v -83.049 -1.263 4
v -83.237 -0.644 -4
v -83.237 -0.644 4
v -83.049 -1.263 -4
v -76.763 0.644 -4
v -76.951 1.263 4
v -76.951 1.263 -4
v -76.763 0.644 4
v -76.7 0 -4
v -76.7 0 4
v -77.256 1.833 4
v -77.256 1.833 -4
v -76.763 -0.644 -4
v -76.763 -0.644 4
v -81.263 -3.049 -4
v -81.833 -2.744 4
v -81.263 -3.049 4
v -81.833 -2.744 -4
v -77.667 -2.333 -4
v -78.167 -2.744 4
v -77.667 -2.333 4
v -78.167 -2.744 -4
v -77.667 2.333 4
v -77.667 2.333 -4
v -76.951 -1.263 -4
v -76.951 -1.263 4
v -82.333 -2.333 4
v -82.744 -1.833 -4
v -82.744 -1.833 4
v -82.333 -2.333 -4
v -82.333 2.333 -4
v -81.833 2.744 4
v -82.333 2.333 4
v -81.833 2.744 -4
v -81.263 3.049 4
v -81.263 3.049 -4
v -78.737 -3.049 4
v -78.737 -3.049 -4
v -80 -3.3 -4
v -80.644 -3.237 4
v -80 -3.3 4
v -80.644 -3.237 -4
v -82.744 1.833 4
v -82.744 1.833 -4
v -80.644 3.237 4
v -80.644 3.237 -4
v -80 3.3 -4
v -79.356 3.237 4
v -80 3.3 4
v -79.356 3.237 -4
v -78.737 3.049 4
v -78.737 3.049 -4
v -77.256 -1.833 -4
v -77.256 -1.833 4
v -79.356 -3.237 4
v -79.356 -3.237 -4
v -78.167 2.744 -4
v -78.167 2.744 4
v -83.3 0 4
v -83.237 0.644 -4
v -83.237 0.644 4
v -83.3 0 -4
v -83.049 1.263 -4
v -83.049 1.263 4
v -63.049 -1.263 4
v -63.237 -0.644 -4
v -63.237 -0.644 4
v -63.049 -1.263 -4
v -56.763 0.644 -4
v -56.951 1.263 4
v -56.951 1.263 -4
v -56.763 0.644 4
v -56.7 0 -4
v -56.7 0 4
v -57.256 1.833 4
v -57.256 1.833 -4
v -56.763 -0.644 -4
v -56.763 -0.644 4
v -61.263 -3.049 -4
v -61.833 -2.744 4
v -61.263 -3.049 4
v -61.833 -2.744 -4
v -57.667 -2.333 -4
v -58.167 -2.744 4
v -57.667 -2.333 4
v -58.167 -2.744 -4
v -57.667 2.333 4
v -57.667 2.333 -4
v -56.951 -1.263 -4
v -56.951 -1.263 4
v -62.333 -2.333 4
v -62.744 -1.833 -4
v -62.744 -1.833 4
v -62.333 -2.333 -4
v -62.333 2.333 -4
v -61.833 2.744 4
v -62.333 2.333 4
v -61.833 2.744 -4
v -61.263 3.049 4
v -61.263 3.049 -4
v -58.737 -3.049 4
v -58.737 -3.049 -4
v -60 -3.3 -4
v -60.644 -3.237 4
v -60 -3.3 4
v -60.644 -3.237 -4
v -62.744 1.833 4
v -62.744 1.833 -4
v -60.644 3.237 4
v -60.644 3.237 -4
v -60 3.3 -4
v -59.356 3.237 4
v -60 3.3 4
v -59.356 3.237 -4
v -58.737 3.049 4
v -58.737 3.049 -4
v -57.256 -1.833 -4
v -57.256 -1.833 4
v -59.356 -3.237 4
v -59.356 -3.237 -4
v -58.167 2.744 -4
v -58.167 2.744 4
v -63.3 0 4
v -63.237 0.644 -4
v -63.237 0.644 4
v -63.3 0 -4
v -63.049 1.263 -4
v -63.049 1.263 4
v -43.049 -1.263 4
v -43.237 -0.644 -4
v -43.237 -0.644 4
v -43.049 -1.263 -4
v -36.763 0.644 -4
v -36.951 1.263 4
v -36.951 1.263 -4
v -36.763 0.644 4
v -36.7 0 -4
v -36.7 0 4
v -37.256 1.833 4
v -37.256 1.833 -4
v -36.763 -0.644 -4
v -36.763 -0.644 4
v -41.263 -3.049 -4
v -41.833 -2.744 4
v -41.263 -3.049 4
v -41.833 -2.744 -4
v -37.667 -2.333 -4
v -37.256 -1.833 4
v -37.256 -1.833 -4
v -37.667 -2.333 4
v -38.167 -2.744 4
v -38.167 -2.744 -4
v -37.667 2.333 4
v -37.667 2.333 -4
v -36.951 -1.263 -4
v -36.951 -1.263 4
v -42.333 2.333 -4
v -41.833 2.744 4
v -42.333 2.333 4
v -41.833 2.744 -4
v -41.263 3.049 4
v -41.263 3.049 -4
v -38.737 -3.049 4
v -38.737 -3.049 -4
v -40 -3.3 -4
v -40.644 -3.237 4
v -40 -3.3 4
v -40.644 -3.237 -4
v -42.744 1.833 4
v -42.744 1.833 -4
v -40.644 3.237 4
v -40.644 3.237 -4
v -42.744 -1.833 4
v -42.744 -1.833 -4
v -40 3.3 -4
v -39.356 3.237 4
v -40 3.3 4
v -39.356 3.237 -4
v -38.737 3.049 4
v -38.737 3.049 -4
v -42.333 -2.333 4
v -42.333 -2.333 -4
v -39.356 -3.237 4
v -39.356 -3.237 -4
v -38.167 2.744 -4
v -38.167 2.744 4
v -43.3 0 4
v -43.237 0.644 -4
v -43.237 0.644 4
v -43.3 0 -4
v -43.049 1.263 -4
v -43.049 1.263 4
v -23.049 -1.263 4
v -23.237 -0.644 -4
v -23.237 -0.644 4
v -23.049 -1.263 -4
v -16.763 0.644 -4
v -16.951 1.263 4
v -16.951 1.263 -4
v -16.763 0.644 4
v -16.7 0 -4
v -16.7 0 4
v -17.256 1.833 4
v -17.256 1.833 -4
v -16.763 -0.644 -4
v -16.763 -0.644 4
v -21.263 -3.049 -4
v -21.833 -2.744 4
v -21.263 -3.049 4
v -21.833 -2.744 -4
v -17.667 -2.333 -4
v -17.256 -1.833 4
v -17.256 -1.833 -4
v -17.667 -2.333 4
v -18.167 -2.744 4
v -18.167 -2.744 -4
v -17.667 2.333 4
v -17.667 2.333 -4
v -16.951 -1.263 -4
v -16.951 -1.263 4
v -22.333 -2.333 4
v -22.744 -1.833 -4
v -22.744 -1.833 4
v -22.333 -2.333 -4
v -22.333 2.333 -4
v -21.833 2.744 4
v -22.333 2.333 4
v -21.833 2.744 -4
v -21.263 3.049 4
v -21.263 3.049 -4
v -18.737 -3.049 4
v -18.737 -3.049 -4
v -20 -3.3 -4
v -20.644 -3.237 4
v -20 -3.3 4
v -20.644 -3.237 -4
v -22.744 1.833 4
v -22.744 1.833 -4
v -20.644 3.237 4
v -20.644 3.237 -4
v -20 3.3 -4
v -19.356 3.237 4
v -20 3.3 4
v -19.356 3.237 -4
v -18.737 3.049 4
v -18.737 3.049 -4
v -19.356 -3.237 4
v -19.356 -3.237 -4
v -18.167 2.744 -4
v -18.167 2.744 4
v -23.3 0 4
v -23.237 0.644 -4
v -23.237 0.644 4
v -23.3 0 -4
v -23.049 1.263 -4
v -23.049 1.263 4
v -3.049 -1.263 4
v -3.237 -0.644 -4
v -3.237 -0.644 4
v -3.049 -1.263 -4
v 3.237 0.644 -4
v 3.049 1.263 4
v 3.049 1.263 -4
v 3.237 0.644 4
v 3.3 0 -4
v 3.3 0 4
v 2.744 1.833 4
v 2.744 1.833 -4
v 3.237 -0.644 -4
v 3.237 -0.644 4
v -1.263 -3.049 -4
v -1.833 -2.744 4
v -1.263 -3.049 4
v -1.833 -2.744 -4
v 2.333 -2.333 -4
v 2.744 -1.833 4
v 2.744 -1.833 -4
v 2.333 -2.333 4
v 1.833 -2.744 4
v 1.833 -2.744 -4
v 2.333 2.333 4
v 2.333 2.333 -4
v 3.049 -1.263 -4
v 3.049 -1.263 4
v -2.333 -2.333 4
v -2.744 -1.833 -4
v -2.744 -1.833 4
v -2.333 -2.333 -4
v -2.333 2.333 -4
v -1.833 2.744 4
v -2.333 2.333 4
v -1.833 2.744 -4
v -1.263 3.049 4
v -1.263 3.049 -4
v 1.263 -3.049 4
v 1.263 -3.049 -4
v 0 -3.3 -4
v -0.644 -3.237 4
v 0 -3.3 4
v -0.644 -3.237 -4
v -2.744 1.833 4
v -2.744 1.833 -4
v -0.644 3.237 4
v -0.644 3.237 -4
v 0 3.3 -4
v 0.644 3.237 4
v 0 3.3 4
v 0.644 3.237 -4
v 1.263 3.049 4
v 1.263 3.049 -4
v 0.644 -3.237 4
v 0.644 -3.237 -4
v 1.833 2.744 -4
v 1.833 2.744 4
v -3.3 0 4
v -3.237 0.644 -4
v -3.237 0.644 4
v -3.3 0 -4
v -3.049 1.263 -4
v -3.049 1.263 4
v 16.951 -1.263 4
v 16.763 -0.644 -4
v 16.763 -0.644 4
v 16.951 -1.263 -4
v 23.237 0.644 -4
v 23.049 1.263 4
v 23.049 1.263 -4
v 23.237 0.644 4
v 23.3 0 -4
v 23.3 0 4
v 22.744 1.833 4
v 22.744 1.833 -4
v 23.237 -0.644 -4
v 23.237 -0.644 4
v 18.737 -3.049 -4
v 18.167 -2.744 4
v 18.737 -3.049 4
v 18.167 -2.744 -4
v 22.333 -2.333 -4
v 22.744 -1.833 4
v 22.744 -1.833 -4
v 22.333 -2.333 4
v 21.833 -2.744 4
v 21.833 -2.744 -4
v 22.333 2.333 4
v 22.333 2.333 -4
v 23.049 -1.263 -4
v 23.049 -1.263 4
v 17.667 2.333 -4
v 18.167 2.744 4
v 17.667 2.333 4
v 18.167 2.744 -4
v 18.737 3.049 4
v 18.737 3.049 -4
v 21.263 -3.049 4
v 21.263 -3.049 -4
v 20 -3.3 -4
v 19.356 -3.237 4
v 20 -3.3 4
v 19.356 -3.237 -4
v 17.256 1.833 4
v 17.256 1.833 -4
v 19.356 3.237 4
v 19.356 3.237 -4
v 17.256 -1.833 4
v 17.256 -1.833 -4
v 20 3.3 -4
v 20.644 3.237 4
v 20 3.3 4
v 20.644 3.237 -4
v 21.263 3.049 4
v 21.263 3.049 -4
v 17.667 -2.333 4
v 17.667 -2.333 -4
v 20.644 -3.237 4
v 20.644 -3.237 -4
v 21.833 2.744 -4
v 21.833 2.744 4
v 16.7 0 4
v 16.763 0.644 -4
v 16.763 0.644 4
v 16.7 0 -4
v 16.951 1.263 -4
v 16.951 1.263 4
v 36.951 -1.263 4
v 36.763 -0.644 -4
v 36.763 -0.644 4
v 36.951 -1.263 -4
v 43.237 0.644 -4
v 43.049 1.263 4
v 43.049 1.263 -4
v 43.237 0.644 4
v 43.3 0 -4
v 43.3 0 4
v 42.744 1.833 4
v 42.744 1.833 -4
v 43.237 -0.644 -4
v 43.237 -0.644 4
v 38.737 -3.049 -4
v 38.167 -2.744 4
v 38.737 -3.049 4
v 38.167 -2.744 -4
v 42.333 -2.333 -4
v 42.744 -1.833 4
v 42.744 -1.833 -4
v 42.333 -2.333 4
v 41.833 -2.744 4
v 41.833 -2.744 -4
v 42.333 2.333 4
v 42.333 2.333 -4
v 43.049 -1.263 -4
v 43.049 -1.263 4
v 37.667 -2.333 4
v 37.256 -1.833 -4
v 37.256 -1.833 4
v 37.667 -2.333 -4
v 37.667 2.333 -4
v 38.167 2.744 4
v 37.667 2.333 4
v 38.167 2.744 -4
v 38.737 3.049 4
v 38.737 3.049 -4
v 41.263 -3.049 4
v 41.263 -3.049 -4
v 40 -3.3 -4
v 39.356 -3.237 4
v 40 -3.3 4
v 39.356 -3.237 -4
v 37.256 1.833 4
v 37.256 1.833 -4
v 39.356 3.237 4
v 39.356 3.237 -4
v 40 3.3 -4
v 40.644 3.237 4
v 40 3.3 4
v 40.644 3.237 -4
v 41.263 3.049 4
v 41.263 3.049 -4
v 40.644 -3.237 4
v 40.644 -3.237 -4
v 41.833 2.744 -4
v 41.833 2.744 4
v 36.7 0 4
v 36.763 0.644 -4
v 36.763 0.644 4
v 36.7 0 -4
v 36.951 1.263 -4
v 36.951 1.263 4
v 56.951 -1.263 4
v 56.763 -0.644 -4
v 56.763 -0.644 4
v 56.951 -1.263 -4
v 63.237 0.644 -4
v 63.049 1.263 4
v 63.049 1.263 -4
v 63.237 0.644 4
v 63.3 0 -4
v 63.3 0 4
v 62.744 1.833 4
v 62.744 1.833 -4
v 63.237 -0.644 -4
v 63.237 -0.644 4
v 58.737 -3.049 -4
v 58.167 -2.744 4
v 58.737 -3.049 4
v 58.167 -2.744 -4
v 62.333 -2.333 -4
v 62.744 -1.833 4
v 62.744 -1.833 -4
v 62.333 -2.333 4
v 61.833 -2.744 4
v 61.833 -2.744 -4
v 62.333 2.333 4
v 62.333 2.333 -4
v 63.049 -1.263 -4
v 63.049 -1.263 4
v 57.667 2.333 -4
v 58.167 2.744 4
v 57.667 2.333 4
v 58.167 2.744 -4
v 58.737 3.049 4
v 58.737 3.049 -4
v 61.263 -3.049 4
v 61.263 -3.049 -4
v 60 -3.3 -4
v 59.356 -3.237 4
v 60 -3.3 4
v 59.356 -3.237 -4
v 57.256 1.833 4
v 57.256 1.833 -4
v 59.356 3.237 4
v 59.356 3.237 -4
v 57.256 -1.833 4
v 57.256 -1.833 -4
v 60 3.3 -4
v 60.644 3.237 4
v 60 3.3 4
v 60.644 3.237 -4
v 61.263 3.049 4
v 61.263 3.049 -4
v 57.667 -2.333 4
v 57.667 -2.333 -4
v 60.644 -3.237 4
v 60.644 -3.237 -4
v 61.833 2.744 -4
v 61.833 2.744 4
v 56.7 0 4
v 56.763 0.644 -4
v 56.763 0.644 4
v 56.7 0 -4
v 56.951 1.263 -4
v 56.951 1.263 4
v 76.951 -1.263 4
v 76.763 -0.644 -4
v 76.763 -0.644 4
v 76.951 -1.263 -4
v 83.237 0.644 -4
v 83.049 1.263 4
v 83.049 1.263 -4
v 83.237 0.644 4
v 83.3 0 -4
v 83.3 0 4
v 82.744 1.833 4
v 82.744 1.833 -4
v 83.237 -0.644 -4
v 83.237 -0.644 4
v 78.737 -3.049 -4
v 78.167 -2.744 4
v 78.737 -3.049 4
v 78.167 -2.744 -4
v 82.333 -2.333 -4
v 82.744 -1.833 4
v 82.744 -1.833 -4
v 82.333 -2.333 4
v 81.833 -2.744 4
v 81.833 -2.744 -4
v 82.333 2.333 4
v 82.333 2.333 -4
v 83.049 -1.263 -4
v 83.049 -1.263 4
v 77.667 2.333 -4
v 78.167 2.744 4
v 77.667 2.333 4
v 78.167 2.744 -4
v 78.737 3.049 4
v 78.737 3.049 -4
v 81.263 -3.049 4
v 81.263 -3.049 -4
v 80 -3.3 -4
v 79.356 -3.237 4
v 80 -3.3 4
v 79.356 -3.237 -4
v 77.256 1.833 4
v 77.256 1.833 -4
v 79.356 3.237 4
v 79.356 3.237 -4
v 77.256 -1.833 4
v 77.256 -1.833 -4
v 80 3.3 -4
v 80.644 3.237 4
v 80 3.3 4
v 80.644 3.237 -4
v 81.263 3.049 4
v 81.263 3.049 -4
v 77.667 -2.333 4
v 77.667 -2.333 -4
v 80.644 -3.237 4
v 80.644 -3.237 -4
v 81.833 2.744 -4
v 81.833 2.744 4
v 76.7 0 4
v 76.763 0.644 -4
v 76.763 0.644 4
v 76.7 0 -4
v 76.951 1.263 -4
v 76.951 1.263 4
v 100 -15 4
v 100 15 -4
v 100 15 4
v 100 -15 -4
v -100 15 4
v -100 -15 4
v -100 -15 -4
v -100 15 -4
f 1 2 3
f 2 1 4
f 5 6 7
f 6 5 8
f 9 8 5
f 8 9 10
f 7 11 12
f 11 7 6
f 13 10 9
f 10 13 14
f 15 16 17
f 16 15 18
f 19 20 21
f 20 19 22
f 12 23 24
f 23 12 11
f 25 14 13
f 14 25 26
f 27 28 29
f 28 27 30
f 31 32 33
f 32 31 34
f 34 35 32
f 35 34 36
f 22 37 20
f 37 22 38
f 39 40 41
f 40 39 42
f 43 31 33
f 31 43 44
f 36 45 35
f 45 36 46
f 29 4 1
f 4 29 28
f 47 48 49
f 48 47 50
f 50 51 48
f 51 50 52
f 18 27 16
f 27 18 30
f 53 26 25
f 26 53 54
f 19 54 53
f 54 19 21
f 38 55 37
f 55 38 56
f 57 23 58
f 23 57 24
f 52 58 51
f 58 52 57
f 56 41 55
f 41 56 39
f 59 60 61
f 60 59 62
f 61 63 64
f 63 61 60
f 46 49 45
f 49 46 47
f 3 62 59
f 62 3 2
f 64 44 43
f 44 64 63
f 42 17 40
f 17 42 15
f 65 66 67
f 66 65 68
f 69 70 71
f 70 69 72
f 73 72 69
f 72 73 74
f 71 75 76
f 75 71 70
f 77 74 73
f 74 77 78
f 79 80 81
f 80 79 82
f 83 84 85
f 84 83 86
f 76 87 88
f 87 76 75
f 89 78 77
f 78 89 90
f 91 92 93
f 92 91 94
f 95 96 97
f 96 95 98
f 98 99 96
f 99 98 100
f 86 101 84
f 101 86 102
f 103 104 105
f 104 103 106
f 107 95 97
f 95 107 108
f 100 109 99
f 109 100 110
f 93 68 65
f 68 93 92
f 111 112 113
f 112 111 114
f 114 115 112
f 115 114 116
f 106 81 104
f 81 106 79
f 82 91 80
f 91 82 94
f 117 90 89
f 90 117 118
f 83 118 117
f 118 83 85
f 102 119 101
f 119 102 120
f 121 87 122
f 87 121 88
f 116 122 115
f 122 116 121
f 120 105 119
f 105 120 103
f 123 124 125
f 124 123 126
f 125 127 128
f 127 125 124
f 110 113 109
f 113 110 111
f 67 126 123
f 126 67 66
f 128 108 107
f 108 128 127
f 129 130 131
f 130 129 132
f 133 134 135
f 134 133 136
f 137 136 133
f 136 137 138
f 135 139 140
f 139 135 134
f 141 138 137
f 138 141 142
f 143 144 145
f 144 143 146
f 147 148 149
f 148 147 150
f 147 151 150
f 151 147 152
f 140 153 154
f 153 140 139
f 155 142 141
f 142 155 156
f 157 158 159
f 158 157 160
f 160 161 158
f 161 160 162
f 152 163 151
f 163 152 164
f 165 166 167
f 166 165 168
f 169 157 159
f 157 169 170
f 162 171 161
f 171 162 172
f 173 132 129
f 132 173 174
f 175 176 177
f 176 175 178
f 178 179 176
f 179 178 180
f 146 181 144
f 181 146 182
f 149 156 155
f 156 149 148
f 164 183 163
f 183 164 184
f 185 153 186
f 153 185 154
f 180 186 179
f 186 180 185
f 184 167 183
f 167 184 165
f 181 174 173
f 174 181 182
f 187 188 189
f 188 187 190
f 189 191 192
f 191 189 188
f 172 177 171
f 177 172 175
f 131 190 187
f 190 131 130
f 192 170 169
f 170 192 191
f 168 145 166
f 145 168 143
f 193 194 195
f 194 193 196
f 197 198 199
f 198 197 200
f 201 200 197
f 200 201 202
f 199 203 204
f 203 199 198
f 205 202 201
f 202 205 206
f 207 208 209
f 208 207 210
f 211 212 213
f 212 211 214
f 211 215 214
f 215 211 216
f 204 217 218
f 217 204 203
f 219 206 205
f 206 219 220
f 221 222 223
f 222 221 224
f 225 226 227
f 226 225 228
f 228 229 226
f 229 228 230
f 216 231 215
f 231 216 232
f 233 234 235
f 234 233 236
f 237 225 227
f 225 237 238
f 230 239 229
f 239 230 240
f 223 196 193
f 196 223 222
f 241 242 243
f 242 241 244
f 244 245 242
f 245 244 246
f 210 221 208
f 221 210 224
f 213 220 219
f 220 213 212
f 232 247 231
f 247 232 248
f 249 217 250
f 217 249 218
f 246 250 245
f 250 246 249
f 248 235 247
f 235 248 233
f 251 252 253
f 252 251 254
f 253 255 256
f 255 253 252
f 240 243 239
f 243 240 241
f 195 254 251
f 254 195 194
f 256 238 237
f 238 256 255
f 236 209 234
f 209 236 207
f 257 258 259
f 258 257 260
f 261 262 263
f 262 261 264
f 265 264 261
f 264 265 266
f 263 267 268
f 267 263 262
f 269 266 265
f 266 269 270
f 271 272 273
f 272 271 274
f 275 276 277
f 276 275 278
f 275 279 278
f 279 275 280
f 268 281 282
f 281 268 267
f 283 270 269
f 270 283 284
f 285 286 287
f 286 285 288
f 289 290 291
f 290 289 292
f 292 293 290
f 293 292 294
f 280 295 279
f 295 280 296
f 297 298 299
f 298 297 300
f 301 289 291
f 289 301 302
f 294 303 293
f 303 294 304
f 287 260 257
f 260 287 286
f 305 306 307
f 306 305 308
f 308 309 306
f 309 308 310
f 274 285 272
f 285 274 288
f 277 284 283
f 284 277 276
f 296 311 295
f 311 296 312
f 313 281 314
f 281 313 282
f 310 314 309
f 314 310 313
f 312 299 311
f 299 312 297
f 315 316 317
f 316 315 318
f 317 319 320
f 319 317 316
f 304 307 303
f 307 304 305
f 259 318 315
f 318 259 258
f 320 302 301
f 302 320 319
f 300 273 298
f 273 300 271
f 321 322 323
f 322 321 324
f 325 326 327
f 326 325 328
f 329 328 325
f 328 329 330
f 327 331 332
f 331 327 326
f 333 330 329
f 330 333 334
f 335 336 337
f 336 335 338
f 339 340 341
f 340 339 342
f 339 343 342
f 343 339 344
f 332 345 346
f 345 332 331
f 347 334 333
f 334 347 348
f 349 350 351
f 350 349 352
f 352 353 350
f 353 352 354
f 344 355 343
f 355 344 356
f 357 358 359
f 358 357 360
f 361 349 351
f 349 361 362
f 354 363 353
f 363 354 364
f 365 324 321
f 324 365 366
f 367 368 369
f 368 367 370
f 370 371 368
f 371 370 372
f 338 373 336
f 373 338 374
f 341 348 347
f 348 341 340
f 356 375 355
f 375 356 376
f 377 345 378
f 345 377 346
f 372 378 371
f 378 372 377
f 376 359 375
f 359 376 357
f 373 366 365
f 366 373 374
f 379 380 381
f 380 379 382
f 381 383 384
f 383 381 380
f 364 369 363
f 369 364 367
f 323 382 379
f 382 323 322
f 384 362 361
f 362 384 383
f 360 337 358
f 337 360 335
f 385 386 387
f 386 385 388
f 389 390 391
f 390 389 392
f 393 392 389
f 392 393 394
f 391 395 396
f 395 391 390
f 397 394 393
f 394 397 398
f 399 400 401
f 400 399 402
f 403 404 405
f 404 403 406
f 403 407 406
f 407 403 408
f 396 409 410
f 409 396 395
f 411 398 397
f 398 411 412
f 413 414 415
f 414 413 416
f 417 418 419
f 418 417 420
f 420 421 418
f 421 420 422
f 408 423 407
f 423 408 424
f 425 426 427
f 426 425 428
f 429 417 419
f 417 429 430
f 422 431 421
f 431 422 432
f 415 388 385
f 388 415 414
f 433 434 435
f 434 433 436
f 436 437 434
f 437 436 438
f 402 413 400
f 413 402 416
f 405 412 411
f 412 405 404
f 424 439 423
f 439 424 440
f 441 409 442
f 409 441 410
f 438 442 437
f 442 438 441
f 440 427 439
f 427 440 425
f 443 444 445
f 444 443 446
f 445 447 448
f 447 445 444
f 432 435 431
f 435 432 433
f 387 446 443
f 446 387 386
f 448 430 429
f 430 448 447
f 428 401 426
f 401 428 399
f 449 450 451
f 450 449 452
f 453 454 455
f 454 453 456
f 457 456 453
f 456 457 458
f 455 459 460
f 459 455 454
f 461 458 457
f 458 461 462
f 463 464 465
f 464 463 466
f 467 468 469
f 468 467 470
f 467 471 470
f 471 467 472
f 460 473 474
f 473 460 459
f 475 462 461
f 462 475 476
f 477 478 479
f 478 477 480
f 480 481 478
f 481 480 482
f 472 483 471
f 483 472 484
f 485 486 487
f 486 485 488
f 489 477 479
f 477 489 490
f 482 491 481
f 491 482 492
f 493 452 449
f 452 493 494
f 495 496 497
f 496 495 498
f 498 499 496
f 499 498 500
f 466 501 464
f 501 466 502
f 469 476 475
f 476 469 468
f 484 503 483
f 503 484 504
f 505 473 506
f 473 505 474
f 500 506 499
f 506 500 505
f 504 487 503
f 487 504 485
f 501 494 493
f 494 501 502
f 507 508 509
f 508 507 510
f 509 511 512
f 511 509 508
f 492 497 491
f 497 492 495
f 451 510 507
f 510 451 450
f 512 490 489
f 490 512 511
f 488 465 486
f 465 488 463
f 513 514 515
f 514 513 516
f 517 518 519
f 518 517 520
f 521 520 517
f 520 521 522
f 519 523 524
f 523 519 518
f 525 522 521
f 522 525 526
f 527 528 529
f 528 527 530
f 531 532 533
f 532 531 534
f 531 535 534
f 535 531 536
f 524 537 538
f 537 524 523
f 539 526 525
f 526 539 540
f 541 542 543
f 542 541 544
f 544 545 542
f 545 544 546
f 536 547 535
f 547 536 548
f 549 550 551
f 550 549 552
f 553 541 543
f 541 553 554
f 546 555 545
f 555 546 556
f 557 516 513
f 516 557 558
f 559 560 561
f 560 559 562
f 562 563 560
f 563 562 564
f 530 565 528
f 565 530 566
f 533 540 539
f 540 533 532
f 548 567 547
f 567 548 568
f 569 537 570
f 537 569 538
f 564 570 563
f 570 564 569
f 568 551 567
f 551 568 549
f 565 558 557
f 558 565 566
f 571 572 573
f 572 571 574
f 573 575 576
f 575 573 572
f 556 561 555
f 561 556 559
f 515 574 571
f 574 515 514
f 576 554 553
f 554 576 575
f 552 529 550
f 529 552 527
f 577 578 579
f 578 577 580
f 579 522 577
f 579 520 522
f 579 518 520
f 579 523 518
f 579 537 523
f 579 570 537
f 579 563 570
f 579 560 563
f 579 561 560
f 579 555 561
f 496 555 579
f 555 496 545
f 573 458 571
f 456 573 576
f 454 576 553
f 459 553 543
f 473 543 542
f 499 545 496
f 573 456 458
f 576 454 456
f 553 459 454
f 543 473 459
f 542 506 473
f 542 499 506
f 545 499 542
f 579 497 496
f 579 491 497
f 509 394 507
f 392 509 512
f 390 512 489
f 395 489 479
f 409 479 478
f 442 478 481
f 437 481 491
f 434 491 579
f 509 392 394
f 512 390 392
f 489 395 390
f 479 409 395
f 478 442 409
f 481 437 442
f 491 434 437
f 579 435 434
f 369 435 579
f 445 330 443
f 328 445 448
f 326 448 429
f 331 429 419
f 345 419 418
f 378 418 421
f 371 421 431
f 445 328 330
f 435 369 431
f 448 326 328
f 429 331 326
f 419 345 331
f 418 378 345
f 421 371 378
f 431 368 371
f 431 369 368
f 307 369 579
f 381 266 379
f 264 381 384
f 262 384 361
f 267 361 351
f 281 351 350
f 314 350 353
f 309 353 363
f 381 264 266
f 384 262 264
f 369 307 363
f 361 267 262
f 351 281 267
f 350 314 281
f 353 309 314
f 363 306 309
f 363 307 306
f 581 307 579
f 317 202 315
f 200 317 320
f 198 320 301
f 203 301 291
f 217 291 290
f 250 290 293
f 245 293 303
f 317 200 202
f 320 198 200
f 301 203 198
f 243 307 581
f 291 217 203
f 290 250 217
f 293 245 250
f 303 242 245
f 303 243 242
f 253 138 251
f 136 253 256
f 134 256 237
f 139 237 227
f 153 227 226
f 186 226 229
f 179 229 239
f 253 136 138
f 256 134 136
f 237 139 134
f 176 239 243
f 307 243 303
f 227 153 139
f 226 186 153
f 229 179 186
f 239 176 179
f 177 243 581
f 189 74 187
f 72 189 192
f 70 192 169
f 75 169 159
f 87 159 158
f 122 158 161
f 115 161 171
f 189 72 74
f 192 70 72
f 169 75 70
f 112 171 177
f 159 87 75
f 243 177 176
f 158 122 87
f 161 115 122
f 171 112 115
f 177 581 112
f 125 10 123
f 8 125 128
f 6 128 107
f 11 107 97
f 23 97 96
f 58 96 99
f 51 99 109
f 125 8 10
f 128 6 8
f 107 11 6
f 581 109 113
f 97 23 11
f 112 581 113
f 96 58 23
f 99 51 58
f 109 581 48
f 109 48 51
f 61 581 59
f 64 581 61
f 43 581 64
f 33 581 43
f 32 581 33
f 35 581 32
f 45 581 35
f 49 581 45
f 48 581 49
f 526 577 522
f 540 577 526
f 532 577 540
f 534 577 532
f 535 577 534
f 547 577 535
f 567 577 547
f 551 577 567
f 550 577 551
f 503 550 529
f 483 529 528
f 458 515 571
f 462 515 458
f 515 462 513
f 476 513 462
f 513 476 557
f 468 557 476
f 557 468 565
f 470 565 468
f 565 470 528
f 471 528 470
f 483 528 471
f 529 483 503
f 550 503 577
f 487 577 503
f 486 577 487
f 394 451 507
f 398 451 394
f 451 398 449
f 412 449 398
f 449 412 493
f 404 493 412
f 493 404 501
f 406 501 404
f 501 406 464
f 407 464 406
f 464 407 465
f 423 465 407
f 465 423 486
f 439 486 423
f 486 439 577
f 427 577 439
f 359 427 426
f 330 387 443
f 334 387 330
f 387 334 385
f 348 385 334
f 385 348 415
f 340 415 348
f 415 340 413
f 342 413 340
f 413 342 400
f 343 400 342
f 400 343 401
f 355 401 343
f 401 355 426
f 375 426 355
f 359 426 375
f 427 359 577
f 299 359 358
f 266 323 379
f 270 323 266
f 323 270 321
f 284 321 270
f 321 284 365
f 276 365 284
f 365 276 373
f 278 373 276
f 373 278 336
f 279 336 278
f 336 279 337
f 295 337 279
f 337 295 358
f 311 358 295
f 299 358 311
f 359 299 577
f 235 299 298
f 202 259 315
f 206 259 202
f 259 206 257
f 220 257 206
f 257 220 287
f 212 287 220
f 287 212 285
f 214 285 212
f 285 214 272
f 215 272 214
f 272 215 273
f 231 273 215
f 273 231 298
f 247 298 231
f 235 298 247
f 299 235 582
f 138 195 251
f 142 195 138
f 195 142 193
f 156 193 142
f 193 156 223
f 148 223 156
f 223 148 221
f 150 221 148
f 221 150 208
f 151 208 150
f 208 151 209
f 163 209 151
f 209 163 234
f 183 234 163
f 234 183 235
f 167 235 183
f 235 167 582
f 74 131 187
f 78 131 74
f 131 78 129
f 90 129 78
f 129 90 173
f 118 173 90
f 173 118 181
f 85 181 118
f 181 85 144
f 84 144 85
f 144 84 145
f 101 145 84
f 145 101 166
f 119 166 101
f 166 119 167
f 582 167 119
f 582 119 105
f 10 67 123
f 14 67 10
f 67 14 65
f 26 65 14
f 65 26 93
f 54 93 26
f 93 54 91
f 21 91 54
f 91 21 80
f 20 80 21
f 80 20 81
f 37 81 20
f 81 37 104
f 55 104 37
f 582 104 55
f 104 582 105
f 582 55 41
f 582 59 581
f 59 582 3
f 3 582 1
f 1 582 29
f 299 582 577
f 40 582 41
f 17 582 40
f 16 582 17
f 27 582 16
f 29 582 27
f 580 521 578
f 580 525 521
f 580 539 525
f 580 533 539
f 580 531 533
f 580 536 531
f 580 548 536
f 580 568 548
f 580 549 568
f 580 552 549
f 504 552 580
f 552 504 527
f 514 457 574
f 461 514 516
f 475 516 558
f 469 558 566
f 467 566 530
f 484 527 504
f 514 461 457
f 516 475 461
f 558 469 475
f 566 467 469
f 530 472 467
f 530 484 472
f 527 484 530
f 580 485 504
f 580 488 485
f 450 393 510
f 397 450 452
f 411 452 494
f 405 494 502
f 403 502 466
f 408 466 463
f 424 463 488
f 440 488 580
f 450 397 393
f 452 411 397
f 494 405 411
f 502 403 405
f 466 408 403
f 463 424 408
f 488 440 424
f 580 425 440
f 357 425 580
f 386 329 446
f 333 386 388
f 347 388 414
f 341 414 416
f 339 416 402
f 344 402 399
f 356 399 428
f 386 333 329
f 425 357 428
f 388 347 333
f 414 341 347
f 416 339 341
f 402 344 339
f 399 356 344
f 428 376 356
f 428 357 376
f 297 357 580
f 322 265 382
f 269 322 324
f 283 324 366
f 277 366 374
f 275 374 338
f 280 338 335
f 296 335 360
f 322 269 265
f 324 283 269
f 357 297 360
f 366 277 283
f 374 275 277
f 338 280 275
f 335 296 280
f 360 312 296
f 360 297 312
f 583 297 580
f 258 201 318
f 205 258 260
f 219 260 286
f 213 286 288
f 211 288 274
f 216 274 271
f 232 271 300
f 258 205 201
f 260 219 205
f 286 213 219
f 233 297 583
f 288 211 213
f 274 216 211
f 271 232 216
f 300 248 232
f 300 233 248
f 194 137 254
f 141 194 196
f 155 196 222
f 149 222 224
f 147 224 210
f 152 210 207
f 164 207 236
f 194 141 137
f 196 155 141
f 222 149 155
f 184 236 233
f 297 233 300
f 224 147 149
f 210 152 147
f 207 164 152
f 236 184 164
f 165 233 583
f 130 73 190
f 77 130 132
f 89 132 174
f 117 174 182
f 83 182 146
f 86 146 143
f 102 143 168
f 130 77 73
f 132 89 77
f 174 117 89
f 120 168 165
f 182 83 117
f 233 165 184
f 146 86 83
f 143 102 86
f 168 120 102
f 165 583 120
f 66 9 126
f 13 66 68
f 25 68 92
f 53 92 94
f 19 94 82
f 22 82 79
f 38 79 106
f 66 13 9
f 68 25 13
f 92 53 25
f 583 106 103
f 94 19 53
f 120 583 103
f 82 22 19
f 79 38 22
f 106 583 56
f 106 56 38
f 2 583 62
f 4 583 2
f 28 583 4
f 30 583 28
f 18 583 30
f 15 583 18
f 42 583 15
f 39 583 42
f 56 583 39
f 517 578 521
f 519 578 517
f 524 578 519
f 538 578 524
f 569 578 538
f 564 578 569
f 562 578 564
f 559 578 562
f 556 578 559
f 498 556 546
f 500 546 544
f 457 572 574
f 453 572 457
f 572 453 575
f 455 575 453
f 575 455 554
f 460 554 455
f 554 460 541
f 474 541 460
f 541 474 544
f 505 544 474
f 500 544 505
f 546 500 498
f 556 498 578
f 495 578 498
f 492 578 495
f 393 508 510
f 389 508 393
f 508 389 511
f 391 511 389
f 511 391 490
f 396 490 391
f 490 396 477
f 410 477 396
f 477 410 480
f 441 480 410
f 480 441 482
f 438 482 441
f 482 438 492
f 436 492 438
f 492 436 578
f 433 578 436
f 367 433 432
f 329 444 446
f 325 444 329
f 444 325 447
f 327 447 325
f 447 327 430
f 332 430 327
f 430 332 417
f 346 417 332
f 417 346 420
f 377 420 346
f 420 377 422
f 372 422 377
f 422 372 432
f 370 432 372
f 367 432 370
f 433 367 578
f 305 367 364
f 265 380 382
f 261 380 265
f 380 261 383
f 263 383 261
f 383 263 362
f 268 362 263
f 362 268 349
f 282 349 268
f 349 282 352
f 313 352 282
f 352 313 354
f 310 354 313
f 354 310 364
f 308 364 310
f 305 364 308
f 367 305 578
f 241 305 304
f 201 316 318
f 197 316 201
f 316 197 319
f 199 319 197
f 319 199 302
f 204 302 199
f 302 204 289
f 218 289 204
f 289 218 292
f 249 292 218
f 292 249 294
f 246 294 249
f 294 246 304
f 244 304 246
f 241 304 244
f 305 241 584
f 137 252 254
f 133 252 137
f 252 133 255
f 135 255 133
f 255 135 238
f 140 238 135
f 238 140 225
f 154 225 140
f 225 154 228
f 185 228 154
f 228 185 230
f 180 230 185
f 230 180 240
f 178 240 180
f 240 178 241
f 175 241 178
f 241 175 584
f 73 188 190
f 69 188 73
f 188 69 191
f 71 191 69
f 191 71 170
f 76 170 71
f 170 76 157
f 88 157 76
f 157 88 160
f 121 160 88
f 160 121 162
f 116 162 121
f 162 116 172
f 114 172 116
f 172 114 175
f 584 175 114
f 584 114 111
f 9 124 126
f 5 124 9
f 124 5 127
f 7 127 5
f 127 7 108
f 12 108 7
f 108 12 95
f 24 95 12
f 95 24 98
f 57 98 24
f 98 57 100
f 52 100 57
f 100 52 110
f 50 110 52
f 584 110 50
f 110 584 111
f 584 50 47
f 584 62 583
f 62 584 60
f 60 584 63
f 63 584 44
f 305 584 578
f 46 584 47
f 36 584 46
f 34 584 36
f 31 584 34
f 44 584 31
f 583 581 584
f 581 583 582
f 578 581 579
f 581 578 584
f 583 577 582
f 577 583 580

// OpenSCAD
$fn = 32;

// ----------------------------------------------------------------------
// Hole bar, 9 x Ø6.6
// skip layout, 20 mm edge offset
// ----------------------------------------------------------------------

// --- parameters (mm) ---
bar_w = 30;       // bar width (Y)
bar_t = 8;        // bar thickness (Z)
holes = 9;        // holes per row
hole_d = 6.6;     // hole diameter
edge = 20;        // offset from the bar end to the first hole
grid_pitch = 10;  // grid the bar was laid out on

// --- derived feature positions (mm) ---
pitch = grid_pitch * 2;       // = 20   holes sit every other grid slot
span = (holes - 1) * pitch;   // = 160   distance between the end holes
bar_l = span + 2 * edge;      // = 200   overall bar length
start_x = -bar_l / 2 + edge;  // = -80   X of the first hole
feature_centers = [
  [start_x + 0 * pitch, 0],
  [start_x + 1 * pitch, 0],
  [start_x + 2 * pitch, 0],
  [start_x + 3 * pitch, 0],
  [start_x + 4 * pitch, 0],
  [start_x + 5 * pitch, 0],
  [start_x + 6 * pitch, 0],
  [start_x + 7 * pitch, 0],
  [start_x + 8 * pitch, 0]
];   // hole centres of the first row

// bar with one row of holes, drilled from feature_centers
difference() {
  translate([-bar_l / 2, -bar_w / 2, -bar_t / 2]) cube([bar_l, bar_w, bar_t]);
  for (centre = feature_centers)
    translate([centre[0], centre[1], 0])
      cylinder(d = hole_d, h = bar_t + 2, center = true);
}
